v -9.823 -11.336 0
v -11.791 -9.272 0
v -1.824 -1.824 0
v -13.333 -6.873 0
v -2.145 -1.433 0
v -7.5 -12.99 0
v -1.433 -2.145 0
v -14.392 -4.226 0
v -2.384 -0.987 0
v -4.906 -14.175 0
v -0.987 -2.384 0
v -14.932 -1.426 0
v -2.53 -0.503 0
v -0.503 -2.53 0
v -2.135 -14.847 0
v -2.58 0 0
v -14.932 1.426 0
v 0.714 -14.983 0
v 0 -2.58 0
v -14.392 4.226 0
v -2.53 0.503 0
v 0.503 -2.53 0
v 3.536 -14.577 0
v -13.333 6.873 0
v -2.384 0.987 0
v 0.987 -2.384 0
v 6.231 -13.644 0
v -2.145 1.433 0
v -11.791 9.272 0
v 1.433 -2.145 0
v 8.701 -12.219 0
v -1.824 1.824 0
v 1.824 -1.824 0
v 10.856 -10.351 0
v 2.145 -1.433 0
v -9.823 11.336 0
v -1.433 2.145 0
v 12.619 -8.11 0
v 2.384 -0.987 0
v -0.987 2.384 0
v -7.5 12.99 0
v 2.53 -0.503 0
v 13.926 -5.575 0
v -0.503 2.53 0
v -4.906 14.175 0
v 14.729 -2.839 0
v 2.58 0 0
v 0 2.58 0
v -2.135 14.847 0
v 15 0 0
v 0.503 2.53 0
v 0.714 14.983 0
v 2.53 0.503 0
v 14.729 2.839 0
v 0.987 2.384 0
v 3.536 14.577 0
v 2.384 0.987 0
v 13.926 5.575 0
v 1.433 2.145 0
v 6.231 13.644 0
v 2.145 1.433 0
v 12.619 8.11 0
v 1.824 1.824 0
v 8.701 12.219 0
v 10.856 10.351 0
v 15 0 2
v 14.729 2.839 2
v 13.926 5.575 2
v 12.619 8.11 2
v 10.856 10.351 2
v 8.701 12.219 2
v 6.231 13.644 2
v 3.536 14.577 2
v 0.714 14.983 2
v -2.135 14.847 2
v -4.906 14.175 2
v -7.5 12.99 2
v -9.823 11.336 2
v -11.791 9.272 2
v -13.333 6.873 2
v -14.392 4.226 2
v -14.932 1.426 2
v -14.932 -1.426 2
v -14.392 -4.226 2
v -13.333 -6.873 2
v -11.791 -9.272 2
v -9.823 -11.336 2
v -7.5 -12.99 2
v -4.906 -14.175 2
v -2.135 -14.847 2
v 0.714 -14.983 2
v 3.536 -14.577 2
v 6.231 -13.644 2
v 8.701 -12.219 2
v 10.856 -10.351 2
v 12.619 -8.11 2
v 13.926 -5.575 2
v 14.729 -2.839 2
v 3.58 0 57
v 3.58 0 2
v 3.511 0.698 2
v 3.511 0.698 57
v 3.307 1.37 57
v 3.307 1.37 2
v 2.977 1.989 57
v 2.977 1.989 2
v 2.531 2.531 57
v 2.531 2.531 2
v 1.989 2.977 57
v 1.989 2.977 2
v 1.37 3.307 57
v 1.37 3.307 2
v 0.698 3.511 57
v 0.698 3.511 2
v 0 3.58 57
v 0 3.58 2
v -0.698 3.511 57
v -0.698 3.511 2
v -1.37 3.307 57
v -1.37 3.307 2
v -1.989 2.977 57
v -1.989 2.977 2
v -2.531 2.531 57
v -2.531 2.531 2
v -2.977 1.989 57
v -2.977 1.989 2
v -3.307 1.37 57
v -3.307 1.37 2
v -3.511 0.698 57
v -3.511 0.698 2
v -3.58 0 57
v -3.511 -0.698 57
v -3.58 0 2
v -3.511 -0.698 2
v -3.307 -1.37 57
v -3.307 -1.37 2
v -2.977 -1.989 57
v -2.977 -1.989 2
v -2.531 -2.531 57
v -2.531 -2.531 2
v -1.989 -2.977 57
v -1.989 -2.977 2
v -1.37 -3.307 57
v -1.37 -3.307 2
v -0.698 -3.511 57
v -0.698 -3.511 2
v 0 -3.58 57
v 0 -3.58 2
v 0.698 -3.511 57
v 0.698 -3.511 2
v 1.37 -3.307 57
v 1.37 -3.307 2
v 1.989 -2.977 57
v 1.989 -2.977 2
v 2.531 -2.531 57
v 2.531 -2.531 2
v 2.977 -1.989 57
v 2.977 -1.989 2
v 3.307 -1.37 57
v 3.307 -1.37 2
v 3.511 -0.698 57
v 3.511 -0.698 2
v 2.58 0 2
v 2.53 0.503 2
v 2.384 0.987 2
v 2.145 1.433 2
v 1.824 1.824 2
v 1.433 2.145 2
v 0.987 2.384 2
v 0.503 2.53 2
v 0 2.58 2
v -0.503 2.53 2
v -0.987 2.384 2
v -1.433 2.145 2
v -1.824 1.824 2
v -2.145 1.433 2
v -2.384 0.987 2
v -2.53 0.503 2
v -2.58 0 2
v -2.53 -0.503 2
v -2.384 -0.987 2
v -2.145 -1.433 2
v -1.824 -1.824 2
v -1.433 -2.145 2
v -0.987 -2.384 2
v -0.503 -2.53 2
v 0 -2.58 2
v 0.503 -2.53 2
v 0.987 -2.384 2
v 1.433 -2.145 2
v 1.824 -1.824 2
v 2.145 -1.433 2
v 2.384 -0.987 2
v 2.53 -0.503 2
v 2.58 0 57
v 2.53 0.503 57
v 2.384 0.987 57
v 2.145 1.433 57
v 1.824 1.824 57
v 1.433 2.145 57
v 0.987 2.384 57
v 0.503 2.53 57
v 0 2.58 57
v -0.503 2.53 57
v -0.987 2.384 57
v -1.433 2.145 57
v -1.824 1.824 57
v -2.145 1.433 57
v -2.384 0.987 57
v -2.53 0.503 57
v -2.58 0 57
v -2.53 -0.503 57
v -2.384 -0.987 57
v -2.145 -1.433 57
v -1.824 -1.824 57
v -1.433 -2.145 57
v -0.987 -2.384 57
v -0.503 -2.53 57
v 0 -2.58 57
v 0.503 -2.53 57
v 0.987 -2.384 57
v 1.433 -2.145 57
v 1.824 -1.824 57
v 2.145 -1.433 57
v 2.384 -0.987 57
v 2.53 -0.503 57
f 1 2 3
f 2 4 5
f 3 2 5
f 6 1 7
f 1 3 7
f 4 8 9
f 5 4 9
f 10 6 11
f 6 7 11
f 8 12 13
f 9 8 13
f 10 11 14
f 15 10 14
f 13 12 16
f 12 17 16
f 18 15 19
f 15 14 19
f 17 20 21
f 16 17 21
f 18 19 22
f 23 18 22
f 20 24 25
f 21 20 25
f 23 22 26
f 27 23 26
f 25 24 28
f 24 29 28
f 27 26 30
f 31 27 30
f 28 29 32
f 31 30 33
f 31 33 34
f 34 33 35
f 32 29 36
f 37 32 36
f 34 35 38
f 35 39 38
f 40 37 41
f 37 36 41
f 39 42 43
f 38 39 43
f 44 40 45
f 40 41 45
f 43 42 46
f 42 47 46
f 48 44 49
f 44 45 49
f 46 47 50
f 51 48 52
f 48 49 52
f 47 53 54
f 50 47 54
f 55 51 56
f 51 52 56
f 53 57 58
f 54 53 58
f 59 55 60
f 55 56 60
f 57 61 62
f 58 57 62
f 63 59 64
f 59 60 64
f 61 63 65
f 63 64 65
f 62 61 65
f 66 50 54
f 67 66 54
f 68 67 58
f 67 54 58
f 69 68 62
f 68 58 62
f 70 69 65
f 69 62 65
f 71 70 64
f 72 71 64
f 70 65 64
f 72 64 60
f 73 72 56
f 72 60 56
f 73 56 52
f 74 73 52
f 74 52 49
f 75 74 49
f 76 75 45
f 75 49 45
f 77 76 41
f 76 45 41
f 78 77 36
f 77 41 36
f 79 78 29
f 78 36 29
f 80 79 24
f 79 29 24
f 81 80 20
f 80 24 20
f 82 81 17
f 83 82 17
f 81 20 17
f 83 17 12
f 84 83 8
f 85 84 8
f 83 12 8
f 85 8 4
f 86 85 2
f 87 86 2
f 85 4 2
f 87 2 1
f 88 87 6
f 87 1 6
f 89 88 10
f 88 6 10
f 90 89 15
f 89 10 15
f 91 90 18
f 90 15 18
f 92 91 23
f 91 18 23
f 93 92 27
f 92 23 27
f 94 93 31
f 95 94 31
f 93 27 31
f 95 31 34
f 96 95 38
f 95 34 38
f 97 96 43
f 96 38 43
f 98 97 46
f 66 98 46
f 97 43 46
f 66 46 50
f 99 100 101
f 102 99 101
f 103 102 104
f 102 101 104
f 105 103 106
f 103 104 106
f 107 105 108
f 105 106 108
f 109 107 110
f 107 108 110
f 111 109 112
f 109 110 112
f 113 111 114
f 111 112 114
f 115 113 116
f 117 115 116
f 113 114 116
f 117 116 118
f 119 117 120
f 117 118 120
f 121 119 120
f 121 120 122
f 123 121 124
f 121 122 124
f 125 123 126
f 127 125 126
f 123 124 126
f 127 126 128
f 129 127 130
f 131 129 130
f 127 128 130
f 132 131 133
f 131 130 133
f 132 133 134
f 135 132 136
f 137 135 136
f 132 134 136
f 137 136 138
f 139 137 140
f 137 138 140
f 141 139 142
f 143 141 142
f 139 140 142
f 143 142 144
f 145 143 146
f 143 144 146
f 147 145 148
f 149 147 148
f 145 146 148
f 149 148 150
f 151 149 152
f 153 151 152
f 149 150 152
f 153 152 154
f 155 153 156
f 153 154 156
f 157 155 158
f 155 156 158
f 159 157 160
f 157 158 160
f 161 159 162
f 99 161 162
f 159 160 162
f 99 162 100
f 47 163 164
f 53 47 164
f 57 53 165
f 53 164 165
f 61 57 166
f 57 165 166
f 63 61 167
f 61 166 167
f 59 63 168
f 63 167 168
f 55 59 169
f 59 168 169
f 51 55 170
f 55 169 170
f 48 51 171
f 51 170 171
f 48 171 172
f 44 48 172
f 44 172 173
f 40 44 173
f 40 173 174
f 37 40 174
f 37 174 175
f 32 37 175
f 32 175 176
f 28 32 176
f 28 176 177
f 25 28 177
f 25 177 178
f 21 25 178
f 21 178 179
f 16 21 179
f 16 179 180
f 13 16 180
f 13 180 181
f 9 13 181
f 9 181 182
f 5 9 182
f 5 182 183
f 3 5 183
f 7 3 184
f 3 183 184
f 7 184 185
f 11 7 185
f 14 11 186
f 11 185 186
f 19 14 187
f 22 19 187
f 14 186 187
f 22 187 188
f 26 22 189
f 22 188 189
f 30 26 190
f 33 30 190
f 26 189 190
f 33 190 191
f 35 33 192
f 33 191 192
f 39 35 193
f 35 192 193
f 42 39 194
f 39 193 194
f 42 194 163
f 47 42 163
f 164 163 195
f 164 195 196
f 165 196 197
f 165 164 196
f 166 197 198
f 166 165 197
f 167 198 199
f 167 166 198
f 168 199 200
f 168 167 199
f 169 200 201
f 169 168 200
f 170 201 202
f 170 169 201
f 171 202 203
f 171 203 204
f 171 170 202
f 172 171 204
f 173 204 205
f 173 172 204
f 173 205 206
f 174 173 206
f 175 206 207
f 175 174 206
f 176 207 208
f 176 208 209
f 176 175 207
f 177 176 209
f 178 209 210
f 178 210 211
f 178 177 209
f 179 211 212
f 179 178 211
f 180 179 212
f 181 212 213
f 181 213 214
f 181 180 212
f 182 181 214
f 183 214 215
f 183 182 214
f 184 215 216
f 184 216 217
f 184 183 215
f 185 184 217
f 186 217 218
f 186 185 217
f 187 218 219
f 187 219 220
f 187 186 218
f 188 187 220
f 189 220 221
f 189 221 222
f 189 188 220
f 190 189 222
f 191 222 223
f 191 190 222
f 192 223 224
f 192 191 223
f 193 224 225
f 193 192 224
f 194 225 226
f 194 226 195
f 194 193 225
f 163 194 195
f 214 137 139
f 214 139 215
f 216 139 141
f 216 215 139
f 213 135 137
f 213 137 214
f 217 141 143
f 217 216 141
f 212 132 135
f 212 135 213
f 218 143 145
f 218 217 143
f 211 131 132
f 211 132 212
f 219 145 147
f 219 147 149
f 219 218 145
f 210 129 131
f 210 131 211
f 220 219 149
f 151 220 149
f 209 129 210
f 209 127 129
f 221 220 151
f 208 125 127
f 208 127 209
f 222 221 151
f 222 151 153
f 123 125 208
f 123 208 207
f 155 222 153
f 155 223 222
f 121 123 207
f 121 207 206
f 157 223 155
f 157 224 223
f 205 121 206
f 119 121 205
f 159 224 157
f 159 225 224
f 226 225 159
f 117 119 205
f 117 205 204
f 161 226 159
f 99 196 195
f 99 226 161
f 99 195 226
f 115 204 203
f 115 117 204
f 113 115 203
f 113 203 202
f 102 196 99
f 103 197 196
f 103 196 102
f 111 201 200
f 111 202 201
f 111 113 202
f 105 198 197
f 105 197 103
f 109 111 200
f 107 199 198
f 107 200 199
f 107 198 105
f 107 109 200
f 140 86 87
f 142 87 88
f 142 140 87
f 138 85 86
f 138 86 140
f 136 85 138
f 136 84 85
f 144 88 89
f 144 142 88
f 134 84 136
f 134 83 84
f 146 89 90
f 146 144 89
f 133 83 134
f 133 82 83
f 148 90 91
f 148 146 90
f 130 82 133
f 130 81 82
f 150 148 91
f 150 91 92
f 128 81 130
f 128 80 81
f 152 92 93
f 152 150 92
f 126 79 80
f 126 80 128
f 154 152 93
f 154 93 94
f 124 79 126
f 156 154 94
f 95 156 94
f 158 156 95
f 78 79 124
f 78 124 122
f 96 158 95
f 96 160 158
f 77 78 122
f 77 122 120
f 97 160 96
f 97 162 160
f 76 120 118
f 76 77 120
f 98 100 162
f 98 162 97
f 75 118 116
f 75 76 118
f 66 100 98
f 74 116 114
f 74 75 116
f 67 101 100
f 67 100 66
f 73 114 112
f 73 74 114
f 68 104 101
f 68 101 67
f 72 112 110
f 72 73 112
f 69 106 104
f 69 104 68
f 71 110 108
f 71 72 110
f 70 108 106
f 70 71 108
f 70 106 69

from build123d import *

# Parameters (mm, degrees)
SKETCH1_R           = 15
BOSS_EXTRUDE1_DEPTH = 2
SKETCH2_R           = 3.58
SKETCH2_R_2         = 2.58
BOSS_EXTRUDE2_DEPTH = 55
SKETCH3_R           = 2.58
CUT_EXTRUDE1_DEPTH  = 55


with BuildPart() as part:
    # Sketch1 → Boss-Extrude1 (new body)
    with BuildSketch(Plane.XY):
        Circle(SKETCH1_R)
    extrude(amount=BOSS_EXTRUDE1_DEPTH)

    # Sketch2 → Boss-Extrude2 (add)
    with BuildSketch(Plane.XY.offset(2)):
        Circle(SKETCH2_R)
        Circle(SKETCH2_R_2, mode=Mode.SUBTRACT)
    extrude(amount=BOSS_EXTRUDE2_DEPTH)

    # Sketch3 → Cut-Extrude1 (cut)
    with BuildSketch(Plane.XY.offset(2)):
        Circle(SKETCH3_R)
    extrude(amount=-CUT_EXTRUDE1_DEPTH, mode=Mode.SUBTRACT)


solid = part.part
